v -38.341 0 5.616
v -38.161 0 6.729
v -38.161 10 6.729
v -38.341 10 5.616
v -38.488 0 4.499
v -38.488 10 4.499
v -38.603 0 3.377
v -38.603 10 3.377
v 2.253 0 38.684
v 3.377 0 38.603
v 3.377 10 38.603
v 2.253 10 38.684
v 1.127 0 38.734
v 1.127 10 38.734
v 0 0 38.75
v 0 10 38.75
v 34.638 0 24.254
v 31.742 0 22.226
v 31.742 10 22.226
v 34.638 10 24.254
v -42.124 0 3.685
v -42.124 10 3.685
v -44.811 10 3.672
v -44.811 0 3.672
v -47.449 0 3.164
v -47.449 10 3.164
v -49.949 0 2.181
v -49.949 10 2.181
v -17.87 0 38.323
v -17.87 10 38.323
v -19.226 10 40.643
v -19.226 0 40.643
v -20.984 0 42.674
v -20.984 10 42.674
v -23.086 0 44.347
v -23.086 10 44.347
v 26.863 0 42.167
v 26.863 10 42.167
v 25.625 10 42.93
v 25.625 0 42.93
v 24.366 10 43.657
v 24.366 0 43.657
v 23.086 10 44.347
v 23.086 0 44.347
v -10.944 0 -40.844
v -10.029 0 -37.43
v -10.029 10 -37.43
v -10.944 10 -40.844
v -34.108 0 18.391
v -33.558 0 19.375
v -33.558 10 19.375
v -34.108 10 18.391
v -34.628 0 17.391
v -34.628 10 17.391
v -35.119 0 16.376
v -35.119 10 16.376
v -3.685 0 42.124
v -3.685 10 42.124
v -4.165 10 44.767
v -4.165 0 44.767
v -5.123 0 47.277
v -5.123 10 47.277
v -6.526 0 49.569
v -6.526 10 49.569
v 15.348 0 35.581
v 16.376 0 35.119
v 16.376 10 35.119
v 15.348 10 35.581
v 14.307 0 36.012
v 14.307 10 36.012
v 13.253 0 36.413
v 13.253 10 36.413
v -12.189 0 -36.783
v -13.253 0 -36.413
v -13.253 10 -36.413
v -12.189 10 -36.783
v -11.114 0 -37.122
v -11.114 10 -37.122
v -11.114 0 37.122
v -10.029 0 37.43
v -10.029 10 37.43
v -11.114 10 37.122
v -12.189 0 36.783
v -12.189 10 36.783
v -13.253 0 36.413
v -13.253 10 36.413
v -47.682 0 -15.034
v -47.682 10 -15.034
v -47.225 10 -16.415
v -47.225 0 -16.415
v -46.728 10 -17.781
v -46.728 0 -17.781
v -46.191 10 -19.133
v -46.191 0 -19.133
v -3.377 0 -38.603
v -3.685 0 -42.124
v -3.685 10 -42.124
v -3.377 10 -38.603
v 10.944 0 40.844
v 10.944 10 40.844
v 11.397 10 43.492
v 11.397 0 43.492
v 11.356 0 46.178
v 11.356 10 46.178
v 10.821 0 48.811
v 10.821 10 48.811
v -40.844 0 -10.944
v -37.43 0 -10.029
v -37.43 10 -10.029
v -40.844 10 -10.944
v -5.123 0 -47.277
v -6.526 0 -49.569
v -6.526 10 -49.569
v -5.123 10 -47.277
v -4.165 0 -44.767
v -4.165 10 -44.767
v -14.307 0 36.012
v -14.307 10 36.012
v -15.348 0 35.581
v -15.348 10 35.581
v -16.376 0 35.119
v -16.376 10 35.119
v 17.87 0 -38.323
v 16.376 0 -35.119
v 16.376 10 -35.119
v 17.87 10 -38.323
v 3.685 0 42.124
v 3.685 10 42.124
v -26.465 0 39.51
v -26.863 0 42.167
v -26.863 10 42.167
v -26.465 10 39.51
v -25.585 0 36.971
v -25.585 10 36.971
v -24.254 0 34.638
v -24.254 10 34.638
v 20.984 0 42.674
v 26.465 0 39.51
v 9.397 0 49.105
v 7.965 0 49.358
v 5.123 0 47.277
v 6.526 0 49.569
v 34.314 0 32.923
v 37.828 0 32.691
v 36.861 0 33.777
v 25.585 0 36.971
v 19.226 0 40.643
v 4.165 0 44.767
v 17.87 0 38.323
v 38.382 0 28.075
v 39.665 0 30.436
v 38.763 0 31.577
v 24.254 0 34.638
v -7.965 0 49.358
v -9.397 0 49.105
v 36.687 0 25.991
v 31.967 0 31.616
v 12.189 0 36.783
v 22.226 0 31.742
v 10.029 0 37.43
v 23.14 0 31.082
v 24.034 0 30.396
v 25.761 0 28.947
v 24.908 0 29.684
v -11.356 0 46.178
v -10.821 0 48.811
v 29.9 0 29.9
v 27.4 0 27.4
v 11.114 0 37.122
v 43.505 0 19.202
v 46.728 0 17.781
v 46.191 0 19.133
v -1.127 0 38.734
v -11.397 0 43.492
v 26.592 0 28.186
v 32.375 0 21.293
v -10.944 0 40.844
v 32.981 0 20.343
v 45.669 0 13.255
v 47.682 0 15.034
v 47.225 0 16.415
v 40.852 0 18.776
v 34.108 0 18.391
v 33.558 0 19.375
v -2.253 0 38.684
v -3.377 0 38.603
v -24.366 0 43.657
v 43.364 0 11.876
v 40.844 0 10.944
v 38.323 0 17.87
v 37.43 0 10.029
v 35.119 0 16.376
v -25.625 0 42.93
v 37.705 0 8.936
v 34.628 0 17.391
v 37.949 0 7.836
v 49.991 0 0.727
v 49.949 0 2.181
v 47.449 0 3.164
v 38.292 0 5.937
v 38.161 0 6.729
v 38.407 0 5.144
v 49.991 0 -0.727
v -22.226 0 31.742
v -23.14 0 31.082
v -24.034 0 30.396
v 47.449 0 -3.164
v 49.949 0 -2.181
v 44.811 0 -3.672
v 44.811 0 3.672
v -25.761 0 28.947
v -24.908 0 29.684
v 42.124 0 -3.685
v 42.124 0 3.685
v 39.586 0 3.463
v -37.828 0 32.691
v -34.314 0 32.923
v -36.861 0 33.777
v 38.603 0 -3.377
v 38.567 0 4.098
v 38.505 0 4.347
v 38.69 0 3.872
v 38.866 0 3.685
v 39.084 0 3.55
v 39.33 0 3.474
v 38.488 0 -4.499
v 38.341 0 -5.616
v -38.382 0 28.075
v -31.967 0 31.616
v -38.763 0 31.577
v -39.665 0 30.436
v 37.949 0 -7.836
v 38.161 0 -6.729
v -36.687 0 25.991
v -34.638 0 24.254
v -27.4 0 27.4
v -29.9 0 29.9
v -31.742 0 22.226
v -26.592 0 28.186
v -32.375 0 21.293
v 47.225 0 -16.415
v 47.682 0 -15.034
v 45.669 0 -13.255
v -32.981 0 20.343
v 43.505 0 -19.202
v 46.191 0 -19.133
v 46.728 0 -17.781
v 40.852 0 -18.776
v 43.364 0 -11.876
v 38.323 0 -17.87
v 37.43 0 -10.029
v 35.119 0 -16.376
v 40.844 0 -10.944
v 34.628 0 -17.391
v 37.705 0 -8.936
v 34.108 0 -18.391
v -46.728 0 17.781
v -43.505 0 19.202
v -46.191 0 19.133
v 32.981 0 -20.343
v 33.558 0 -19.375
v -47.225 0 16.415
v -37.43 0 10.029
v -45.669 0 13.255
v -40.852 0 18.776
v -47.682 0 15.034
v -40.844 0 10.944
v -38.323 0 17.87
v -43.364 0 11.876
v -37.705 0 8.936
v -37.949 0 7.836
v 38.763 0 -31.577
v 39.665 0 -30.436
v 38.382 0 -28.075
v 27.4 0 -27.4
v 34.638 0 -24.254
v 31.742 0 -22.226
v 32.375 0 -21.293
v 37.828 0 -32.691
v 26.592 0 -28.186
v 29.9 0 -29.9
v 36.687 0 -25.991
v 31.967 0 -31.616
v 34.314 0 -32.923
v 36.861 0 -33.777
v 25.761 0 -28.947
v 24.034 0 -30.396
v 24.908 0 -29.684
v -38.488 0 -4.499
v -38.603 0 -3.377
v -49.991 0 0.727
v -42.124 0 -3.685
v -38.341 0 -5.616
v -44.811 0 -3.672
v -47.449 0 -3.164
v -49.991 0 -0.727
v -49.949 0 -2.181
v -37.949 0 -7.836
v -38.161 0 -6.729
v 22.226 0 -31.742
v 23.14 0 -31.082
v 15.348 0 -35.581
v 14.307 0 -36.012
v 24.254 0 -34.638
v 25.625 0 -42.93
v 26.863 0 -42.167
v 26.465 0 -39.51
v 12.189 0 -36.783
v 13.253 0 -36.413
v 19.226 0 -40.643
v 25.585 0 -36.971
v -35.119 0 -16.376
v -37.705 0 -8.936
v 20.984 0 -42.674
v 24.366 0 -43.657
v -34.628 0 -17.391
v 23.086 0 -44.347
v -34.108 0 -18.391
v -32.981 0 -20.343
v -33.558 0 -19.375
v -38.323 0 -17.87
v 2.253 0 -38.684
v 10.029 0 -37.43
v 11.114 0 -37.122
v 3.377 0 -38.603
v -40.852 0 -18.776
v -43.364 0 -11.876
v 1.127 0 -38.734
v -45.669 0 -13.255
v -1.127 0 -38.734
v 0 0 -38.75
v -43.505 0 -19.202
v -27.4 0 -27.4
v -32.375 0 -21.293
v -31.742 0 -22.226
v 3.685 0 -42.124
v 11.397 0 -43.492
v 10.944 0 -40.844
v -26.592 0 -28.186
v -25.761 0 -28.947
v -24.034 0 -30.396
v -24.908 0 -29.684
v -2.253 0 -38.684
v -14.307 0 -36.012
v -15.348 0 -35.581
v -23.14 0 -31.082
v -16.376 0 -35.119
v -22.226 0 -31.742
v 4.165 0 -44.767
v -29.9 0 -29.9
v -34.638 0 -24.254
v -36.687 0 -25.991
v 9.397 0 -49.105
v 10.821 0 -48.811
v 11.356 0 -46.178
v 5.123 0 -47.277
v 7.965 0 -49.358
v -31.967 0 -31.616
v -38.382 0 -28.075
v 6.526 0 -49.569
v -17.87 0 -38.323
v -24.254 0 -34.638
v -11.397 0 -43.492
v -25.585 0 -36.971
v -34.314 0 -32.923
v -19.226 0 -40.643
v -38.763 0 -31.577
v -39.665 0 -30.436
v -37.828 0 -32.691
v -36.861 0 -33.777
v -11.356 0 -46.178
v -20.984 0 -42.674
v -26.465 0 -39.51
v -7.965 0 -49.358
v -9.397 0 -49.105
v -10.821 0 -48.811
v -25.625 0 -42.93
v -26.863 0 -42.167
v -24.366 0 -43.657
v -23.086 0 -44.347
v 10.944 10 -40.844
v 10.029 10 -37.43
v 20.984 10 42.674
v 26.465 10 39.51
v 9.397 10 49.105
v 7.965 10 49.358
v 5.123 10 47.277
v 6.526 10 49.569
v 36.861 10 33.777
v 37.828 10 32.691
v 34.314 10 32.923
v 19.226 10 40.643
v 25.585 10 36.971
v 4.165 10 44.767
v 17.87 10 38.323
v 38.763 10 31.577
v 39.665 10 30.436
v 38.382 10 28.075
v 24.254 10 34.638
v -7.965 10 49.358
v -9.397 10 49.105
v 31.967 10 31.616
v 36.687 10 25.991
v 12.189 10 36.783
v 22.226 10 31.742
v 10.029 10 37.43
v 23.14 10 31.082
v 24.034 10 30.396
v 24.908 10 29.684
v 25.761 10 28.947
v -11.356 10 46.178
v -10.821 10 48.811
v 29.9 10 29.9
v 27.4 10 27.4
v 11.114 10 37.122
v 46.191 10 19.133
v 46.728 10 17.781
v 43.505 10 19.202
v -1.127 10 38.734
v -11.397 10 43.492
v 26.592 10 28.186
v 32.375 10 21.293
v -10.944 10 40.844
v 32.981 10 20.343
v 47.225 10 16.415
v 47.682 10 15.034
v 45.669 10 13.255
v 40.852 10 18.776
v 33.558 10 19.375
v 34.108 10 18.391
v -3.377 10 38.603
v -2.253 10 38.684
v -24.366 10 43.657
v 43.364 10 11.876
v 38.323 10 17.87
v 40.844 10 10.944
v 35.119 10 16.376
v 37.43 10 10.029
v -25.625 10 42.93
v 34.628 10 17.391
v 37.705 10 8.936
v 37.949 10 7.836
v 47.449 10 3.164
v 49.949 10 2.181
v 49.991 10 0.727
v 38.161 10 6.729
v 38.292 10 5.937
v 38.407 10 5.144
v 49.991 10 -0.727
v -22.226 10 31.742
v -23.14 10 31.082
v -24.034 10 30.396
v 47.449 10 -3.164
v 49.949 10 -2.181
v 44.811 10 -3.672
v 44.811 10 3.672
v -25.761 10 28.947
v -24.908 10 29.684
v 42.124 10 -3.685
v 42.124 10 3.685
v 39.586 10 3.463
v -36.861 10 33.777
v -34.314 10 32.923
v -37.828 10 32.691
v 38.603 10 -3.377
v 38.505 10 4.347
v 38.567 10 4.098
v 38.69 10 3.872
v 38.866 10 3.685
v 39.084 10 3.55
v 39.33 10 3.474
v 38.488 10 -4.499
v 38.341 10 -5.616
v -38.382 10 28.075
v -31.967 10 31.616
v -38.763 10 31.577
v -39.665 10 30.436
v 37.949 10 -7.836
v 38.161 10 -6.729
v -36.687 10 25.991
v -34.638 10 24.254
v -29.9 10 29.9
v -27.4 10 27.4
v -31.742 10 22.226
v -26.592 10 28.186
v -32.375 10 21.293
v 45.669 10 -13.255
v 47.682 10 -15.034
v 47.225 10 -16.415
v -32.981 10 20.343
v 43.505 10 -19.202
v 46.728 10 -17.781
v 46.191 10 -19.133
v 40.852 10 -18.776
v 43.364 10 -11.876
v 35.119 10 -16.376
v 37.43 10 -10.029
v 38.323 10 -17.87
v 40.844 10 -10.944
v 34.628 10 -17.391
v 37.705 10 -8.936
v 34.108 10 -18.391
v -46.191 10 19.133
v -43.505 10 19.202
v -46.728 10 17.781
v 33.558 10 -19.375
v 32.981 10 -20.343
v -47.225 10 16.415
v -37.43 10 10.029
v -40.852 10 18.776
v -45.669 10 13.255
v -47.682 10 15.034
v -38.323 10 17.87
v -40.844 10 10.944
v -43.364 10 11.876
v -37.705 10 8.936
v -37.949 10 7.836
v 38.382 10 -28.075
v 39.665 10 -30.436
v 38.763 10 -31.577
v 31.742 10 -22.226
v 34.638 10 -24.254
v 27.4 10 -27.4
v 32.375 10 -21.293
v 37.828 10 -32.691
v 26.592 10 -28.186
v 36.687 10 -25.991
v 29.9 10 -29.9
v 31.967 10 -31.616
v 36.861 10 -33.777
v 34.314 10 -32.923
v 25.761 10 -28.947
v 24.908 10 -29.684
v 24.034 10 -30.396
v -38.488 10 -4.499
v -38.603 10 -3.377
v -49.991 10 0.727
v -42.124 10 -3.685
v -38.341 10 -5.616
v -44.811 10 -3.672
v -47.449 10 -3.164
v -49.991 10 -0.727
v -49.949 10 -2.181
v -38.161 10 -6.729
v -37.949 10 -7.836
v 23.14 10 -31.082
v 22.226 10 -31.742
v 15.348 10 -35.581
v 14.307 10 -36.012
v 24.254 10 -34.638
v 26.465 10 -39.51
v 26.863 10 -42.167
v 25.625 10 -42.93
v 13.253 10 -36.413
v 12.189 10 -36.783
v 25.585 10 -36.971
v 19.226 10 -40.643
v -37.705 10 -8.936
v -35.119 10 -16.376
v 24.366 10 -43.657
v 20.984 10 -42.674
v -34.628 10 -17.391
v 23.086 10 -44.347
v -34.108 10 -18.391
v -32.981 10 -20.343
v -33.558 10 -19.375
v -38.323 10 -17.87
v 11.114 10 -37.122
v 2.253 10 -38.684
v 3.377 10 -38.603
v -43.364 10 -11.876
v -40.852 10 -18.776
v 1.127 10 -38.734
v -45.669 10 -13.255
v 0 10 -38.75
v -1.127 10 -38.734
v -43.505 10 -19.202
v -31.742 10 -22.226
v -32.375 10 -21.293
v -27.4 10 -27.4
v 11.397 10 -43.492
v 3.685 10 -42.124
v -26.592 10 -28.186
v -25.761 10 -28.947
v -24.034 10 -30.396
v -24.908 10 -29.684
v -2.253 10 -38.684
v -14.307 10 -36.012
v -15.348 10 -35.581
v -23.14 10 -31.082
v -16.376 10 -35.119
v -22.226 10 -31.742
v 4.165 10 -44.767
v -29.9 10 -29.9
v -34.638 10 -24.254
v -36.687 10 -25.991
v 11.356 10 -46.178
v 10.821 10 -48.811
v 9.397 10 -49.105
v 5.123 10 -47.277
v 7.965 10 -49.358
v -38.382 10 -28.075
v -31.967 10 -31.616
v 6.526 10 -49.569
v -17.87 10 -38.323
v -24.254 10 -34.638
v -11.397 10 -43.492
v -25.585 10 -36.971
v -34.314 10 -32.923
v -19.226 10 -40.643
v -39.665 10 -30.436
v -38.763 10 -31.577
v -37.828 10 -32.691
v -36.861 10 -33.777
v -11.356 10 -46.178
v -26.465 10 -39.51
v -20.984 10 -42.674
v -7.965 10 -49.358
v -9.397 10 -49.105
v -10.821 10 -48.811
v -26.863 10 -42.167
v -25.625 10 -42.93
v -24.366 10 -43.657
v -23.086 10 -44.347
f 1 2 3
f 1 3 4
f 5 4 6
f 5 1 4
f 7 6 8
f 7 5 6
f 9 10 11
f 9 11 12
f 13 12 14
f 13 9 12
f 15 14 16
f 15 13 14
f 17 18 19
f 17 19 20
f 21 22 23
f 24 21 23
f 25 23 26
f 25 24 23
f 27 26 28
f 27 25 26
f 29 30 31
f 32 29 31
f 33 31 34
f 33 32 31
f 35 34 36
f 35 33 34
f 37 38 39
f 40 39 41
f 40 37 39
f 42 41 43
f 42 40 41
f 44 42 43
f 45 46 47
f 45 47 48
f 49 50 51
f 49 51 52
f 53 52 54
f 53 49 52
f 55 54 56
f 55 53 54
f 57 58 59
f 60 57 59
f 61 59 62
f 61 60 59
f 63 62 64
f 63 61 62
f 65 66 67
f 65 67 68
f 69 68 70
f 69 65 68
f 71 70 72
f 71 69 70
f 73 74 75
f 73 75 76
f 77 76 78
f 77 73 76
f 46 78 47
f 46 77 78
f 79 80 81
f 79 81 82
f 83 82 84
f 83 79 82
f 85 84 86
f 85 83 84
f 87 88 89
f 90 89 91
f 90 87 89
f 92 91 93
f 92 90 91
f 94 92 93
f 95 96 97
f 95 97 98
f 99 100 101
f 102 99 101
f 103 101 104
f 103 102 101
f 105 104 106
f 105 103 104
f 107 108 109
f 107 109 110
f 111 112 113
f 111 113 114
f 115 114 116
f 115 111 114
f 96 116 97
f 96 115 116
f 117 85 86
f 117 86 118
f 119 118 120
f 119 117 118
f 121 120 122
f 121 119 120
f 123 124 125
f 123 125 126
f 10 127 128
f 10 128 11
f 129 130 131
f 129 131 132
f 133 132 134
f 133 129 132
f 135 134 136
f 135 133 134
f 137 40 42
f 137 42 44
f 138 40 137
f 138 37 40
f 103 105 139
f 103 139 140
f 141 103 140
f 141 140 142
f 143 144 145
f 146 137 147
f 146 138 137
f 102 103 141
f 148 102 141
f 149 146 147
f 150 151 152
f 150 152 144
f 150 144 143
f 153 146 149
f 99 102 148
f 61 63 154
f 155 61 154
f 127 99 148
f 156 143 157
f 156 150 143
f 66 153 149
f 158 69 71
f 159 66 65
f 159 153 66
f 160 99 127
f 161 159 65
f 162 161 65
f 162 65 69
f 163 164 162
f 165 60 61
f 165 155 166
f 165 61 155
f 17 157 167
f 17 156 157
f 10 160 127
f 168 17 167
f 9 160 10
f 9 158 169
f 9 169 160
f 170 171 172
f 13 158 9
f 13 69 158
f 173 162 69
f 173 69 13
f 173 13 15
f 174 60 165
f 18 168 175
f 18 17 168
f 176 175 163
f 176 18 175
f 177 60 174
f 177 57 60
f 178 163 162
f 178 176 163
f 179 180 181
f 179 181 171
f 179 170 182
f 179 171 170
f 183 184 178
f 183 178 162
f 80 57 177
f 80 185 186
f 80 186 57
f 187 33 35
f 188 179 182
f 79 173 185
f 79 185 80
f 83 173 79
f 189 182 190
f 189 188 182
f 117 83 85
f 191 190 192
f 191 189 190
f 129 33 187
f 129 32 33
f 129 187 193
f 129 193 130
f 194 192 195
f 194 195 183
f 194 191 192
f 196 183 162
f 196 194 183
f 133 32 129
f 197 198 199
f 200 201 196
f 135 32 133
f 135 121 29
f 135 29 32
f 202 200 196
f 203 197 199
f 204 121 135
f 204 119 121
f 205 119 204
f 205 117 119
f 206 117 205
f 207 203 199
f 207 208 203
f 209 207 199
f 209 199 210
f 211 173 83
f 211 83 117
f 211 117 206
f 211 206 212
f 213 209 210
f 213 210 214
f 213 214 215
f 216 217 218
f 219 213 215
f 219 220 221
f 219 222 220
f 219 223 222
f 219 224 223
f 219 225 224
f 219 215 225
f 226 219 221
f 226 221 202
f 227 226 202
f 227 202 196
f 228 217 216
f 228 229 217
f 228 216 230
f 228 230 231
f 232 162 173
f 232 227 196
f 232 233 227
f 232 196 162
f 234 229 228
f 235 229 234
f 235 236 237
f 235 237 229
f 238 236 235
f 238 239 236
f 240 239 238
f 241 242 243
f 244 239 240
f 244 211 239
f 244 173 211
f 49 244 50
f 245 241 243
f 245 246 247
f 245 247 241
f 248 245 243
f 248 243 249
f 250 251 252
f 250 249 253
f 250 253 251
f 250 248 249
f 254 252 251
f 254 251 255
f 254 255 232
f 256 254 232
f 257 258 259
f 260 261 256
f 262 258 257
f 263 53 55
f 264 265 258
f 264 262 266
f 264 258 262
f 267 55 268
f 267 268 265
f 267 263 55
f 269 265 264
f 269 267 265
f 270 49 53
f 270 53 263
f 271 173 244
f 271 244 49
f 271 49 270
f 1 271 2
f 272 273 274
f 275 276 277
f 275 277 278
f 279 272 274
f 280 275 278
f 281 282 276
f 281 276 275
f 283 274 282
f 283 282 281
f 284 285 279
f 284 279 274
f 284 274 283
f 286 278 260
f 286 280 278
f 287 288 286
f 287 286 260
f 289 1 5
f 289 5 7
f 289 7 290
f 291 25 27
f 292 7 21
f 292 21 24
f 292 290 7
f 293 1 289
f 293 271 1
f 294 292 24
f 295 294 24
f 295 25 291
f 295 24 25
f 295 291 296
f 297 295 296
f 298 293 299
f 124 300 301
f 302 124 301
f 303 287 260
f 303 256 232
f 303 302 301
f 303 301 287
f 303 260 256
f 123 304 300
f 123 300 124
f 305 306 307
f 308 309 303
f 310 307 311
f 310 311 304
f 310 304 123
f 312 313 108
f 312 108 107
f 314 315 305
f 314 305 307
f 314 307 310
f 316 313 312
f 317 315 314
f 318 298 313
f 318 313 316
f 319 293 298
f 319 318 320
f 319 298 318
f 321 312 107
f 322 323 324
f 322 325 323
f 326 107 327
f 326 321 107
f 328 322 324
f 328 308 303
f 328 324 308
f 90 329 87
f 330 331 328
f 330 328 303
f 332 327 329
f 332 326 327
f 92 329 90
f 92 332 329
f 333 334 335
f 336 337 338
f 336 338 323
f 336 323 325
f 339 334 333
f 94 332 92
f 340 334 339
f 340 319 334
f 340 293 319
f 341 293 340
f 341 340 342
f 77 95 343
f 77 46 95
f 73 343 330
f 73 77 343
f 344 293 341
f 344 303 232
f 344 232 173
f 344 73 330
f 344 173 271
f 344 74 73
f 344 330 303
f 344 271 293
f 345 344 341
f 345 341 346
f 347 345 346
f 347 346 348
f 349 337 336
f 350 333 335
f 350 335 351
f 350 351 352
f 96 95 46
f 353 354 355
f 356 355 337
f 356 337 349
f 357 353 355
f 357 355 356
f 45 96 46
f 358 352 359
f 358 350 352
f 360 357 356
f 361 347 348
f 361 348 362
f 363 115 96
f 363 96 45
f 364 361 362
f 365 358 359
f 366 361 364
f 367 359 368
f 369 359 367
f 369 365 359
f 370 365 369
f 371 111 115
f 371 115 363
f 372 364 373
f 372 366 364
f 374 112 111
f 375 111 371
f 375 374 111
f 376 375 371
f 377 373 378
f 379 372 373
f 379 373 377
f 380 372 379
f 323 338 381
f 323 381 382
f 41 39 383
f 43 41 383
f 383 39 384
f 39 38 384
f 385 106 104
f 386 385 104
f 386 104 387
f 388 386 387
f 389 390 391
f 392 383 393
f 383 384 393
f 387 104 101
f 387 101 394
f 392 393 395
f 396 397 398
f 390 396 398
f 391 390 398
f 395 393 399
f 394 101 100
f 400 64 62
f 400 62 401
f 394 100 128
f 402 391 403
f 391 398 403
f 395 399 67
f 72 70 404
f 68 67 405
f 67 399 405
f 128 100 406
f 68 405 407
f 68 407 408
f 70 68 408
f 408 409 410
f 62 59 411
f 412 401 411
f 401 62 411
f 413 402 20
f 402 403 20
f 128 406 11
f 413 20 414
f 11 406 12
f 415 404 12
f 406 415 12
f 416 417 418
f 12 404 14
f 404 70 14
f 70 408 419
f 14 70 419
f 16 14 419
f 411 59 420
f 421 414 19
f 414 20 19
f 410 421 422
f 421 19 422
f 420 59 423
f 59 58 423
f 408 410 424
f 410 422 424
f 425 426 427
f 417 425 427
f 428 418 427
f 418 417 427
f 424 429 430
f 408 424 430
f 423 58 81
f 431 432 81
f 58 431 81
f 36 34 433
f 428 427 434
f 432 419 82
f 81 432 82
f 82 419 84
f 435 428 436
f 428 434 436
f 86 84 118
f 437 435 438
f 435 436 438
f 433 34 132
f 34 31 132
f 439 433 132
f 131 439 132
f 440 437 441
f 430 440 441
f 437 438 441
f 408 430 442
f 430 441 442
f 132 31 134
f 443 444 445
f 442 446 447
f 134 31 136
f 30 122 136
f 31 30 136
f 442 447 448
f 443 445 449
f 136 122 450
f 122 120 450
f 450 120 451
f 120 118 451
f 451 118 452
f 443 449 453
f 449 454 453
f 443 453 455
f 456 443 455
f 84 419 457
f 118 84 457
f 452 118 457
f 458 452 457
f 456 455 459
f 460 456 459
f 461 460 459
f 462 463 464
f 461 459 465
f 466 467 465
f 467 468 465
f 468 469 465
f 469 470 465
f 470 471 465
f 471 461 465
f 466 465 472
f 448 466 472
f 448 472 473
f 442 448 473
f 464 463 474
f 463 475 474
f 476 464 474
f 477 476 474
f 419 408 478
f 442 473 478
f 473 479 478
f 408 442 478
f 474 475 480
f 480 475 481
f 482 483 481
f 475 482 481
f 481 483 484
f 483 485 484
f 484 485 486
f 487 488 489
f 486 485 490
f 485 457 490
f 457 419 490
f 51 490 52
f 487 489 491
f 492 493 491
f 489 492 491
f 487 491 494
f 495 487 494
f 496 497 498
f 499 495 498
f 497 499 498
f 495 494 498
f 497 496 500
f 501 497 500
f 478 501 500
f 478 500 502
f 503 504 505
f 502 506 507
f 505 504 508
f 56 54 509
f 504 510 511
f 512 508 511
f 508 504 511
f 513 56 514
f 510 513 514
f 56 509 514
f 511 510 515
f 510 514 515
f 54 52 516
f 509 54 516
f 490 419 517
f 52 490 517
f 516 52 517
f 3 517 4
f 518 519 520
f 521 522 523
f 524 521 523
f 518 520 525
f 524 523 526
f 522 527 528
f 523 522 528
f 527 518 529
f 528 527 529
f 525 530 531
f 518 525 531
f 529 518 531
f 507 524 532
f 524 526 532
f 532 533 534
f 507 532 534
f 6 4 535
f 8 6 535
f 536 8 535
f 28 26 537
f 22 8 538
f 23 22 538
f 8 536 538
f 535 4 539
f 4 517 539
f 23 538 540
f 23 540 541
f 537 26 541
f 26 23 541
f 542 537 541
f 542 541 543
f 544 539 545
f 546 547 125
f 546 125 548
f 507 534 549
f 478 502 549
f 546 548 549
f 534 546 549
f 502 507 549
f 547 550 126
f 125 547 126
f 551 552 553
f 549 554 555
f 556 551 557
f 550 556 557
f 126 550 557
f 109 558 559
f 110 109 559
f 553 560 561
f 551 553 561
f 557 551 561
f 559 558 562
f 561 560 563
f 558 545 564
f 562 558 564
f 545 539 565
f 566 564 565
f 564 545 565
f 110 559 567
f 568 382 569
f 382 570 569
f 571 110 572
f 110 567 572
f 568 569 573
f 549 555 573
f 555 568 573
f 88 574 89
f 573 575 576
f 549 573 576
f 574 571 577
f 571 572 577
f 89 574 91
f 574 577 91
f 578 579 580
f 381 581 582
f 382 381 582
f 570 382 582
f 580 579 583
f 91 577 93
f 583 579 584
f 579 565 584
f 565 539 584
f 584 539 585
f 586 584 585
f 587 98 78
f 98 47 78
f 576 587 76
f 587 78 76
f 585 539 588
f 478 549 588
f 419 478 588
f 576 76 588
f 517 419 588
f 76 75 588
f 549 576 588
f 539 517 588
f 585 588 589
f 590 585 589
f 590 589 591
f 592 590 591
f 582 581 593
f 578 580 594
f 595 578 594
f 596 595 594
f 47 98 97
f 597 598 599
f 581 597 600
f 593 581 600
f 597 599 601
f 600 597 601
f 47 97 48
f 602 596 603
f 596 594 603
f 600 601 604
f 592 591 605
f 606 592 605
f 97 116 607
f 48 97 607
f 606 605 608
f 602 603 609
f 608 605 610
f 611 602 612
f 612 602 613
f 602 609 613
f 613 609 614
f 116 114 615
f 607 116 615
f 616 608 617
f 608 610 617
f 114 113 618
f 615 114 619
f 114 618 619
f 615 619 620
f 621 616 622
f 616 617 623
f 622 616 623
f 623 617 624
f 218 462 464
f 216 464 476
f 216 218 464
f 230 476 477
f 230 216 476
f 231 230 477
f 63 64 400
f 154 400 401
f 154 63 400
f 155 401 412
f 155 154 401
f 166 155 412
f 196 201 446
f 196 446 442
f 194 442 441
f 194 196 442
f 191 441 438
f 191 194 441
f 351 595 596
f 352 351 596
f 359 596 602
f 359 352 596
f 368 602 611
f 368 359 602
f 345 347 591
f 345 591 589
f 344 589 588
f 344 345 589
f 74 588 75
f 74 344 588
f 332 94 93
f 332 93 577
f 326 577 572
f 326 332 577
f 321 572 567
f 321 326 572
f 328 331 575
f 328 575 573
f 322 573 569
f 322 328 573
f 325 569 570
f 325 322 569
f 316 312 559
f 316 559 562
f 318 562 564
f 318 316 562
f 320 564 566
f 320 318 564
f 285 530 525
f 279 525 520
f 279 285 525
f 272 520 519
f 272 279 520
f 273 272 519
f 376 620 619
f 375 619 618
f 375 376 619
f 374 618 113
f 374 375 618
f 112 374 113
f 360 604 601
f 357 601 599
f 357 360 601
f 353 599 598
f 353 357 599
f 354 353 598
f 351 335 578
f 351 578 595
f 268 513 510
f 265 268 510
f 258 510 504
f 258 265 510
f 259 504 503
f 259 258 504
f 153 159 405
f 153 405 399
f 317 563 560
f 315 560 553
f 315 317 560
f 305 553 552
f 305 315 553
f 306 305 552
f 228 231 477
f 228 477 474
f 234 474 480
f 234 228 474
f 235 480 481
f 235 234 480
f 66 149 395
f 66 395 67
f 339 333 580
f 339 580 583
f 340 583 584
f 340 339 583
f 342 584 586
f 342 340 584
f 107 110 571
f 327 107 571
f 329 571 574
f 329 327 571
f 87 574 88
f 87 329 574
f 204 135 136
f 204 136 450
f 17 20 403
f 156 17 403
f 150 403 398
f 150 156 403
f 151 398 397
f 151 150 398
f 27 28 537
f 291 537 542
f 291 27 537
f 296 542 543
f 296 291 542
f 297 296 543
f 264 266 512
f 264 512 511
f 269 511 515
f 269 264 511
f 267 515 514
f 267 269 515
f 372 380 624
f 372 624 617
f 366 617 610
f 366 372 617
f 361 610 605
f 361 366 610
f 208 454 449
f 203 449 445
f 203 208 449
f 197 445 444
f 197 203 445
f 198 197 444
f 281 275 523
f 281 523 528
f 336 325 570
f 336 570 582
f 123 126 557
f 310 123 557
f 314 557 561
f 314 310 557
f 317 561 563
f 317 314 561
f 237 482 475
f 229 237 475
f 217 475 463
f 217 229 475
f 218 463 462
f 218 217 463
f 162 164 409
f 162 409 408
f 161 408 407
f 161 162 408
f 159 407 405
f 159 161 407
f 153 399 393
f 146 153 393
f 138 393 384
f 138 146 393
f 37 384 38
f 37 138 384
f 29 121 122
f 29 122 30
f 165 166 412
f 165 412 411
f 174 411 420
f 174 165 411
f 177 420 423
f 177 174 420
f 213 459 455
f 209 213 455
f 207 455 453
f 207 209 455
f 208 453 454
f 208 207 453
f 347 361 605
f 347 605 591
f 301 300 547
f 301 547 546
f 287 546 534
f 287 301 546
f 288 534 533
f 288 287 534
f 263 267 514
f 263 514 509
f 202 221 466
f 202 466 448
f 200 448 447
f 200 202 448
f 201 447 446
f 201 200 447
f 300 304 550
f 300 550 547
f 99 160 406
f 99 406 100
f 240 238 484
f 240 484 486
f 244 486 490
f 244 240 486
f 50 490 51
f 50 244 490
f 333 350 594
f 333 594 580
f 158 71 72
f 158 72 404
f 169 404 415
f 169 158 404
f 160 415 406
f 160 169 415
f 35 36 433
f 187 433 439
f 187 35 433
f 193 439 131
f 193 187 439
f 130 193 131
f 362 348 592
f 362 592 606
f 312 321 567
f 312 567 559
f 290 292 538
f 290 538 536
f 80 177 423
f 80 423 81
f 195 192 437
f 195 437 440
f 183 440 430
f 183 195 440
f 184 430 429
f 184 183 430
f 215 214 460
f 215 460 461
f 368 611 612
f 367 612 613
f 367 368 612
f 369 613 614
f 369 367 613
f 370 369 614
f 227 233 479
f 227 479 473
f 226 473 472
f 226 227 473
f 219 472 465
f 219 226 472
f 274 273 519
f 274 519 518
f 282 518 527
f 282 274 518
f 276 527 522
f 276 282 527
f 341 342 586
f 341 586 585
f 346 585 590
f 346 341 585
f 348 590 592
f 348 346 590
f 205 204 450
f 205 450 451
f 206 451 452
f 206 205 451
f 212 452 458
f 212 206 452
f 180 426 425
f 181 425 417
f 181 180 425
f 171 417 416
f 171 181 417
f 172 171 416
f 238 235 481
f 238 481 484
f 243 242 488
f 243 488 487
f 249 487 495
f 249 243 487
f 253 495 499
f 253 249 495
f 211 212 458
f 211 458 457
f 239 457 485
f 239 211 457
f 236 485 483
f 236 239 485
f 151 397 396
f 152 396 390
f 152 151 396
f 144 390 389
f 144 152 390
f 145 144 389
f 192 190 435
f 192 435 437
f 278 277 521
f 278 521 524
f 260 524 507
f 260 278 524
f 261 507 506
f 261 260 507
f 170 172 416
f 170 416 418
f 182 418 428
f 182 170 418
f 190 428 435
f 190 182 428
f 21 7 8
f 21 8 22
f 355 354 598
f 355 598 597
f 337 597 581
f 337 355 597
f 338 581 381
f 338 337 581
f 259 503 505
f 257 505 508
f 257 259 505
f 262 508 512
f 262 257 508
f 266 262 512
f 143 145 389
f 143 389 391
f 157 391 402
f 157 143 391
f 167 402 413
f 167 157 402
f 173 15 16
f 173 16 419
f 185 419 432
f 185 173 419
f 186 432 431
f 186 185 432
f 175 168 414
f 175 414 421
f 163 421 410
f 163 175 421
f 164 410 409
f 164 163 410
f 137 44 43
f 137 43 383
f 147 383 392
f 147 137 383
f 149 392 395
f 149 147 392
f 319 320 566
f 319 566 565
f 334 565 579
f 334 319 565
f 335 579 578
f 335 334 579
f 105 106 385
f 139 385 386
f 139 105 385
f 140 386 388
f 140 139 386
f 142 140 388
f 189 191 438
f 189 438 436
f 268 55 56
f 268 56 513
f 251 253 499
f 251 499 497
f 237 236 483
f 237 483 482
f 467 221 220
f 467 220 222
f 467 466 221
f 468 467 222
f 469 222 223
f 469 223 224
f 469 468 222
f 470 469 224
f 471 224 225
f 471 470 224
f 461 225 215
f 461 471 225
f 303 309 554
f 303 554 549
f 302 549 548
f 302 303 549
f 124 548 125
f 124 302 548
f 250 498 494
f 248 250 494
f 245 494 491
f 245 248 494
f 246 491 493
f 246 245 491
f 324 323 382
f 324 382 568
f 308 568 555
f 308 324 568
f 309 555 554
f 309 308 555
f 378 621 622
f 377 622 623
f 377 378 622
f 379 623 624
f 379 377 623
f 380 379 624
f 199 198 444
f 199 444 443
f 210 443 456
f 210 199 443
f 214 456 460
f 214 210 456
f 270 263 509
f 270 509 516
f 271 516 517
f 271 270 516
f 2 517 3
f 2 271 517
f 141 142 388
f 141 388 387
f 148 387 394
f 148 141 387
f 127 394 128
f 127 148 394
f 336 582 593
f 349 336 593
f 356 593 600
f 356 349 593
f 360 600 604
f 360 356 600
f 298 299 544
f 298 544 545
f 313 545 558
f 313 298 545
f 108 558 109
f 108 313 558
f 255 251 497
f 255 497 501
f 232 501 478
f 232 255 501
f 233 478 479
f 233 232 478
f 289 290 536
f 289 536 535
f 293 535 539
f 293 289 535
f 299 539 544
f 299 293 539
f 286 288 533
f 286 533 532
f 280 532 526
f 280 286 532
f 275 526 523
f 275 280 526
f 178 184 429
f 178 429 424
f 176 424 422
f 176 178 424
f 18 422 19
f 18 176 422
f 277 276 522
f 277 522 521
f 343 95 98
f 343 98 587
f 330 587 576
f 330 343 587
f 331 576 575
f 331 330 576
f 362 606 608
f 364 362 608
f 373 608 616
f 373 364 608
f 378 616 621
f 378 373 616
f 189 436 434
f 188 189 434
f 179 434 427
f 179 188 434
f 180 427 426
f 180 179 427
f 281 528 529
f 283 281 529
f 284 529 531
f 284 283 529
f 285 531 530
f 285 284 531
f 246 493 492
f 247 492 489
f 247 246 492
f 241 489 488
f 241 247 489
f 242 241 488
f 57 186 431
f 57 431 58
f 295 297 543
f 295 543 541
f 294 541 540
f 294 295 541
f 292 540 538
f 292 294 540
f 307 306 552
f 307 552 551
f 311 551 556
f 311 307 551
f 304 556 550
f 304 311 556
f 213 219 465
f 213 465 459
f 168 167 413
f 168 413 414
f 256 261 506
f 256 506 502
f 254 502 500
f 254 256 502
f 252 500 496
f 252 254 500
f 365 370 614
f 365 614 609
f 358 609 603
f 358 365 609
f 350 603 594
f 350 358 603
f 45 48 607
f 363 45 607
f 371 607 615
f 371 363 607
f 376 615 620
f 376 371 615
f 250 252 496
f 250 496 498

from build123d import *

# Parameters (mm, degrees)
BOSS_EXTRUDE1_DEPTH = 10
FILLET4_R           = 1
CIRPATTERN1_COUNT   = 18


with BuildPart() as part:
    # Sketch1 → Boss-Extrude1 (new body)
    with BuildSketch(Plane(origin=(0, 0, 0), x_dir=(1, 0, 0), z_dir=(0, 1, 0))):
        with BuildLine():
            ThreePointArc((38.602544551, -3.377285031), (38.418488378, -5.057889949), (38.161300429, -6.728866885))
            Line((38.161300429, -6.728866885), (0, 0))
            Line((0, 0), (38.161300429, 6.728866885))
            ThreePointArc((38.161300429, 6.728866885), (38.418488378, 5.057889949), (38.602544551, 3.377285031))
            Line((38.602544551, 3.377285031), (42.124092809, 3.685380582))
            ThreePointArc((42.124092809, 3.685380582), (46.141395468, 3.478911596), (49.948794335, 2.180811458))
            ThreePointArc((49.948794335, 2.180811458), (49.99637981, 0), (49.948794335, -2.180811458))
            ThreePointArc((49.948794335, -2.180811458), (46.141395468, -3.478911596), (42.124092809, -3.685380582))
            Line((42.124092809, -3.685380582), (38.602544551, -3.377285031))
        make_face()
    boss_extrude1 = extrude(amount=BOSS_EXTRUDE1_DEPTH)

    # Fillet4
    fillet4_edges = [part.edges().sort_by_distance(p)[0] for p in [
        (38.602544551, 5, 3.377285031),
    ]]
    fillet(fillet4_edges, radius=FILLET4_R)

    # CirPattern1: Boss-Extrude1 ×18 about axis
    cirpattern1_axis = Axis((0, 0, 0), (0, 1, 0))
    for i in range(1, CIRPATTERN1_COUNT):
        add(boss_extrude1.rotate(cirpattern1_axis, i * 360 / CIRPATTERN1_COUNT))


solid = part.part
